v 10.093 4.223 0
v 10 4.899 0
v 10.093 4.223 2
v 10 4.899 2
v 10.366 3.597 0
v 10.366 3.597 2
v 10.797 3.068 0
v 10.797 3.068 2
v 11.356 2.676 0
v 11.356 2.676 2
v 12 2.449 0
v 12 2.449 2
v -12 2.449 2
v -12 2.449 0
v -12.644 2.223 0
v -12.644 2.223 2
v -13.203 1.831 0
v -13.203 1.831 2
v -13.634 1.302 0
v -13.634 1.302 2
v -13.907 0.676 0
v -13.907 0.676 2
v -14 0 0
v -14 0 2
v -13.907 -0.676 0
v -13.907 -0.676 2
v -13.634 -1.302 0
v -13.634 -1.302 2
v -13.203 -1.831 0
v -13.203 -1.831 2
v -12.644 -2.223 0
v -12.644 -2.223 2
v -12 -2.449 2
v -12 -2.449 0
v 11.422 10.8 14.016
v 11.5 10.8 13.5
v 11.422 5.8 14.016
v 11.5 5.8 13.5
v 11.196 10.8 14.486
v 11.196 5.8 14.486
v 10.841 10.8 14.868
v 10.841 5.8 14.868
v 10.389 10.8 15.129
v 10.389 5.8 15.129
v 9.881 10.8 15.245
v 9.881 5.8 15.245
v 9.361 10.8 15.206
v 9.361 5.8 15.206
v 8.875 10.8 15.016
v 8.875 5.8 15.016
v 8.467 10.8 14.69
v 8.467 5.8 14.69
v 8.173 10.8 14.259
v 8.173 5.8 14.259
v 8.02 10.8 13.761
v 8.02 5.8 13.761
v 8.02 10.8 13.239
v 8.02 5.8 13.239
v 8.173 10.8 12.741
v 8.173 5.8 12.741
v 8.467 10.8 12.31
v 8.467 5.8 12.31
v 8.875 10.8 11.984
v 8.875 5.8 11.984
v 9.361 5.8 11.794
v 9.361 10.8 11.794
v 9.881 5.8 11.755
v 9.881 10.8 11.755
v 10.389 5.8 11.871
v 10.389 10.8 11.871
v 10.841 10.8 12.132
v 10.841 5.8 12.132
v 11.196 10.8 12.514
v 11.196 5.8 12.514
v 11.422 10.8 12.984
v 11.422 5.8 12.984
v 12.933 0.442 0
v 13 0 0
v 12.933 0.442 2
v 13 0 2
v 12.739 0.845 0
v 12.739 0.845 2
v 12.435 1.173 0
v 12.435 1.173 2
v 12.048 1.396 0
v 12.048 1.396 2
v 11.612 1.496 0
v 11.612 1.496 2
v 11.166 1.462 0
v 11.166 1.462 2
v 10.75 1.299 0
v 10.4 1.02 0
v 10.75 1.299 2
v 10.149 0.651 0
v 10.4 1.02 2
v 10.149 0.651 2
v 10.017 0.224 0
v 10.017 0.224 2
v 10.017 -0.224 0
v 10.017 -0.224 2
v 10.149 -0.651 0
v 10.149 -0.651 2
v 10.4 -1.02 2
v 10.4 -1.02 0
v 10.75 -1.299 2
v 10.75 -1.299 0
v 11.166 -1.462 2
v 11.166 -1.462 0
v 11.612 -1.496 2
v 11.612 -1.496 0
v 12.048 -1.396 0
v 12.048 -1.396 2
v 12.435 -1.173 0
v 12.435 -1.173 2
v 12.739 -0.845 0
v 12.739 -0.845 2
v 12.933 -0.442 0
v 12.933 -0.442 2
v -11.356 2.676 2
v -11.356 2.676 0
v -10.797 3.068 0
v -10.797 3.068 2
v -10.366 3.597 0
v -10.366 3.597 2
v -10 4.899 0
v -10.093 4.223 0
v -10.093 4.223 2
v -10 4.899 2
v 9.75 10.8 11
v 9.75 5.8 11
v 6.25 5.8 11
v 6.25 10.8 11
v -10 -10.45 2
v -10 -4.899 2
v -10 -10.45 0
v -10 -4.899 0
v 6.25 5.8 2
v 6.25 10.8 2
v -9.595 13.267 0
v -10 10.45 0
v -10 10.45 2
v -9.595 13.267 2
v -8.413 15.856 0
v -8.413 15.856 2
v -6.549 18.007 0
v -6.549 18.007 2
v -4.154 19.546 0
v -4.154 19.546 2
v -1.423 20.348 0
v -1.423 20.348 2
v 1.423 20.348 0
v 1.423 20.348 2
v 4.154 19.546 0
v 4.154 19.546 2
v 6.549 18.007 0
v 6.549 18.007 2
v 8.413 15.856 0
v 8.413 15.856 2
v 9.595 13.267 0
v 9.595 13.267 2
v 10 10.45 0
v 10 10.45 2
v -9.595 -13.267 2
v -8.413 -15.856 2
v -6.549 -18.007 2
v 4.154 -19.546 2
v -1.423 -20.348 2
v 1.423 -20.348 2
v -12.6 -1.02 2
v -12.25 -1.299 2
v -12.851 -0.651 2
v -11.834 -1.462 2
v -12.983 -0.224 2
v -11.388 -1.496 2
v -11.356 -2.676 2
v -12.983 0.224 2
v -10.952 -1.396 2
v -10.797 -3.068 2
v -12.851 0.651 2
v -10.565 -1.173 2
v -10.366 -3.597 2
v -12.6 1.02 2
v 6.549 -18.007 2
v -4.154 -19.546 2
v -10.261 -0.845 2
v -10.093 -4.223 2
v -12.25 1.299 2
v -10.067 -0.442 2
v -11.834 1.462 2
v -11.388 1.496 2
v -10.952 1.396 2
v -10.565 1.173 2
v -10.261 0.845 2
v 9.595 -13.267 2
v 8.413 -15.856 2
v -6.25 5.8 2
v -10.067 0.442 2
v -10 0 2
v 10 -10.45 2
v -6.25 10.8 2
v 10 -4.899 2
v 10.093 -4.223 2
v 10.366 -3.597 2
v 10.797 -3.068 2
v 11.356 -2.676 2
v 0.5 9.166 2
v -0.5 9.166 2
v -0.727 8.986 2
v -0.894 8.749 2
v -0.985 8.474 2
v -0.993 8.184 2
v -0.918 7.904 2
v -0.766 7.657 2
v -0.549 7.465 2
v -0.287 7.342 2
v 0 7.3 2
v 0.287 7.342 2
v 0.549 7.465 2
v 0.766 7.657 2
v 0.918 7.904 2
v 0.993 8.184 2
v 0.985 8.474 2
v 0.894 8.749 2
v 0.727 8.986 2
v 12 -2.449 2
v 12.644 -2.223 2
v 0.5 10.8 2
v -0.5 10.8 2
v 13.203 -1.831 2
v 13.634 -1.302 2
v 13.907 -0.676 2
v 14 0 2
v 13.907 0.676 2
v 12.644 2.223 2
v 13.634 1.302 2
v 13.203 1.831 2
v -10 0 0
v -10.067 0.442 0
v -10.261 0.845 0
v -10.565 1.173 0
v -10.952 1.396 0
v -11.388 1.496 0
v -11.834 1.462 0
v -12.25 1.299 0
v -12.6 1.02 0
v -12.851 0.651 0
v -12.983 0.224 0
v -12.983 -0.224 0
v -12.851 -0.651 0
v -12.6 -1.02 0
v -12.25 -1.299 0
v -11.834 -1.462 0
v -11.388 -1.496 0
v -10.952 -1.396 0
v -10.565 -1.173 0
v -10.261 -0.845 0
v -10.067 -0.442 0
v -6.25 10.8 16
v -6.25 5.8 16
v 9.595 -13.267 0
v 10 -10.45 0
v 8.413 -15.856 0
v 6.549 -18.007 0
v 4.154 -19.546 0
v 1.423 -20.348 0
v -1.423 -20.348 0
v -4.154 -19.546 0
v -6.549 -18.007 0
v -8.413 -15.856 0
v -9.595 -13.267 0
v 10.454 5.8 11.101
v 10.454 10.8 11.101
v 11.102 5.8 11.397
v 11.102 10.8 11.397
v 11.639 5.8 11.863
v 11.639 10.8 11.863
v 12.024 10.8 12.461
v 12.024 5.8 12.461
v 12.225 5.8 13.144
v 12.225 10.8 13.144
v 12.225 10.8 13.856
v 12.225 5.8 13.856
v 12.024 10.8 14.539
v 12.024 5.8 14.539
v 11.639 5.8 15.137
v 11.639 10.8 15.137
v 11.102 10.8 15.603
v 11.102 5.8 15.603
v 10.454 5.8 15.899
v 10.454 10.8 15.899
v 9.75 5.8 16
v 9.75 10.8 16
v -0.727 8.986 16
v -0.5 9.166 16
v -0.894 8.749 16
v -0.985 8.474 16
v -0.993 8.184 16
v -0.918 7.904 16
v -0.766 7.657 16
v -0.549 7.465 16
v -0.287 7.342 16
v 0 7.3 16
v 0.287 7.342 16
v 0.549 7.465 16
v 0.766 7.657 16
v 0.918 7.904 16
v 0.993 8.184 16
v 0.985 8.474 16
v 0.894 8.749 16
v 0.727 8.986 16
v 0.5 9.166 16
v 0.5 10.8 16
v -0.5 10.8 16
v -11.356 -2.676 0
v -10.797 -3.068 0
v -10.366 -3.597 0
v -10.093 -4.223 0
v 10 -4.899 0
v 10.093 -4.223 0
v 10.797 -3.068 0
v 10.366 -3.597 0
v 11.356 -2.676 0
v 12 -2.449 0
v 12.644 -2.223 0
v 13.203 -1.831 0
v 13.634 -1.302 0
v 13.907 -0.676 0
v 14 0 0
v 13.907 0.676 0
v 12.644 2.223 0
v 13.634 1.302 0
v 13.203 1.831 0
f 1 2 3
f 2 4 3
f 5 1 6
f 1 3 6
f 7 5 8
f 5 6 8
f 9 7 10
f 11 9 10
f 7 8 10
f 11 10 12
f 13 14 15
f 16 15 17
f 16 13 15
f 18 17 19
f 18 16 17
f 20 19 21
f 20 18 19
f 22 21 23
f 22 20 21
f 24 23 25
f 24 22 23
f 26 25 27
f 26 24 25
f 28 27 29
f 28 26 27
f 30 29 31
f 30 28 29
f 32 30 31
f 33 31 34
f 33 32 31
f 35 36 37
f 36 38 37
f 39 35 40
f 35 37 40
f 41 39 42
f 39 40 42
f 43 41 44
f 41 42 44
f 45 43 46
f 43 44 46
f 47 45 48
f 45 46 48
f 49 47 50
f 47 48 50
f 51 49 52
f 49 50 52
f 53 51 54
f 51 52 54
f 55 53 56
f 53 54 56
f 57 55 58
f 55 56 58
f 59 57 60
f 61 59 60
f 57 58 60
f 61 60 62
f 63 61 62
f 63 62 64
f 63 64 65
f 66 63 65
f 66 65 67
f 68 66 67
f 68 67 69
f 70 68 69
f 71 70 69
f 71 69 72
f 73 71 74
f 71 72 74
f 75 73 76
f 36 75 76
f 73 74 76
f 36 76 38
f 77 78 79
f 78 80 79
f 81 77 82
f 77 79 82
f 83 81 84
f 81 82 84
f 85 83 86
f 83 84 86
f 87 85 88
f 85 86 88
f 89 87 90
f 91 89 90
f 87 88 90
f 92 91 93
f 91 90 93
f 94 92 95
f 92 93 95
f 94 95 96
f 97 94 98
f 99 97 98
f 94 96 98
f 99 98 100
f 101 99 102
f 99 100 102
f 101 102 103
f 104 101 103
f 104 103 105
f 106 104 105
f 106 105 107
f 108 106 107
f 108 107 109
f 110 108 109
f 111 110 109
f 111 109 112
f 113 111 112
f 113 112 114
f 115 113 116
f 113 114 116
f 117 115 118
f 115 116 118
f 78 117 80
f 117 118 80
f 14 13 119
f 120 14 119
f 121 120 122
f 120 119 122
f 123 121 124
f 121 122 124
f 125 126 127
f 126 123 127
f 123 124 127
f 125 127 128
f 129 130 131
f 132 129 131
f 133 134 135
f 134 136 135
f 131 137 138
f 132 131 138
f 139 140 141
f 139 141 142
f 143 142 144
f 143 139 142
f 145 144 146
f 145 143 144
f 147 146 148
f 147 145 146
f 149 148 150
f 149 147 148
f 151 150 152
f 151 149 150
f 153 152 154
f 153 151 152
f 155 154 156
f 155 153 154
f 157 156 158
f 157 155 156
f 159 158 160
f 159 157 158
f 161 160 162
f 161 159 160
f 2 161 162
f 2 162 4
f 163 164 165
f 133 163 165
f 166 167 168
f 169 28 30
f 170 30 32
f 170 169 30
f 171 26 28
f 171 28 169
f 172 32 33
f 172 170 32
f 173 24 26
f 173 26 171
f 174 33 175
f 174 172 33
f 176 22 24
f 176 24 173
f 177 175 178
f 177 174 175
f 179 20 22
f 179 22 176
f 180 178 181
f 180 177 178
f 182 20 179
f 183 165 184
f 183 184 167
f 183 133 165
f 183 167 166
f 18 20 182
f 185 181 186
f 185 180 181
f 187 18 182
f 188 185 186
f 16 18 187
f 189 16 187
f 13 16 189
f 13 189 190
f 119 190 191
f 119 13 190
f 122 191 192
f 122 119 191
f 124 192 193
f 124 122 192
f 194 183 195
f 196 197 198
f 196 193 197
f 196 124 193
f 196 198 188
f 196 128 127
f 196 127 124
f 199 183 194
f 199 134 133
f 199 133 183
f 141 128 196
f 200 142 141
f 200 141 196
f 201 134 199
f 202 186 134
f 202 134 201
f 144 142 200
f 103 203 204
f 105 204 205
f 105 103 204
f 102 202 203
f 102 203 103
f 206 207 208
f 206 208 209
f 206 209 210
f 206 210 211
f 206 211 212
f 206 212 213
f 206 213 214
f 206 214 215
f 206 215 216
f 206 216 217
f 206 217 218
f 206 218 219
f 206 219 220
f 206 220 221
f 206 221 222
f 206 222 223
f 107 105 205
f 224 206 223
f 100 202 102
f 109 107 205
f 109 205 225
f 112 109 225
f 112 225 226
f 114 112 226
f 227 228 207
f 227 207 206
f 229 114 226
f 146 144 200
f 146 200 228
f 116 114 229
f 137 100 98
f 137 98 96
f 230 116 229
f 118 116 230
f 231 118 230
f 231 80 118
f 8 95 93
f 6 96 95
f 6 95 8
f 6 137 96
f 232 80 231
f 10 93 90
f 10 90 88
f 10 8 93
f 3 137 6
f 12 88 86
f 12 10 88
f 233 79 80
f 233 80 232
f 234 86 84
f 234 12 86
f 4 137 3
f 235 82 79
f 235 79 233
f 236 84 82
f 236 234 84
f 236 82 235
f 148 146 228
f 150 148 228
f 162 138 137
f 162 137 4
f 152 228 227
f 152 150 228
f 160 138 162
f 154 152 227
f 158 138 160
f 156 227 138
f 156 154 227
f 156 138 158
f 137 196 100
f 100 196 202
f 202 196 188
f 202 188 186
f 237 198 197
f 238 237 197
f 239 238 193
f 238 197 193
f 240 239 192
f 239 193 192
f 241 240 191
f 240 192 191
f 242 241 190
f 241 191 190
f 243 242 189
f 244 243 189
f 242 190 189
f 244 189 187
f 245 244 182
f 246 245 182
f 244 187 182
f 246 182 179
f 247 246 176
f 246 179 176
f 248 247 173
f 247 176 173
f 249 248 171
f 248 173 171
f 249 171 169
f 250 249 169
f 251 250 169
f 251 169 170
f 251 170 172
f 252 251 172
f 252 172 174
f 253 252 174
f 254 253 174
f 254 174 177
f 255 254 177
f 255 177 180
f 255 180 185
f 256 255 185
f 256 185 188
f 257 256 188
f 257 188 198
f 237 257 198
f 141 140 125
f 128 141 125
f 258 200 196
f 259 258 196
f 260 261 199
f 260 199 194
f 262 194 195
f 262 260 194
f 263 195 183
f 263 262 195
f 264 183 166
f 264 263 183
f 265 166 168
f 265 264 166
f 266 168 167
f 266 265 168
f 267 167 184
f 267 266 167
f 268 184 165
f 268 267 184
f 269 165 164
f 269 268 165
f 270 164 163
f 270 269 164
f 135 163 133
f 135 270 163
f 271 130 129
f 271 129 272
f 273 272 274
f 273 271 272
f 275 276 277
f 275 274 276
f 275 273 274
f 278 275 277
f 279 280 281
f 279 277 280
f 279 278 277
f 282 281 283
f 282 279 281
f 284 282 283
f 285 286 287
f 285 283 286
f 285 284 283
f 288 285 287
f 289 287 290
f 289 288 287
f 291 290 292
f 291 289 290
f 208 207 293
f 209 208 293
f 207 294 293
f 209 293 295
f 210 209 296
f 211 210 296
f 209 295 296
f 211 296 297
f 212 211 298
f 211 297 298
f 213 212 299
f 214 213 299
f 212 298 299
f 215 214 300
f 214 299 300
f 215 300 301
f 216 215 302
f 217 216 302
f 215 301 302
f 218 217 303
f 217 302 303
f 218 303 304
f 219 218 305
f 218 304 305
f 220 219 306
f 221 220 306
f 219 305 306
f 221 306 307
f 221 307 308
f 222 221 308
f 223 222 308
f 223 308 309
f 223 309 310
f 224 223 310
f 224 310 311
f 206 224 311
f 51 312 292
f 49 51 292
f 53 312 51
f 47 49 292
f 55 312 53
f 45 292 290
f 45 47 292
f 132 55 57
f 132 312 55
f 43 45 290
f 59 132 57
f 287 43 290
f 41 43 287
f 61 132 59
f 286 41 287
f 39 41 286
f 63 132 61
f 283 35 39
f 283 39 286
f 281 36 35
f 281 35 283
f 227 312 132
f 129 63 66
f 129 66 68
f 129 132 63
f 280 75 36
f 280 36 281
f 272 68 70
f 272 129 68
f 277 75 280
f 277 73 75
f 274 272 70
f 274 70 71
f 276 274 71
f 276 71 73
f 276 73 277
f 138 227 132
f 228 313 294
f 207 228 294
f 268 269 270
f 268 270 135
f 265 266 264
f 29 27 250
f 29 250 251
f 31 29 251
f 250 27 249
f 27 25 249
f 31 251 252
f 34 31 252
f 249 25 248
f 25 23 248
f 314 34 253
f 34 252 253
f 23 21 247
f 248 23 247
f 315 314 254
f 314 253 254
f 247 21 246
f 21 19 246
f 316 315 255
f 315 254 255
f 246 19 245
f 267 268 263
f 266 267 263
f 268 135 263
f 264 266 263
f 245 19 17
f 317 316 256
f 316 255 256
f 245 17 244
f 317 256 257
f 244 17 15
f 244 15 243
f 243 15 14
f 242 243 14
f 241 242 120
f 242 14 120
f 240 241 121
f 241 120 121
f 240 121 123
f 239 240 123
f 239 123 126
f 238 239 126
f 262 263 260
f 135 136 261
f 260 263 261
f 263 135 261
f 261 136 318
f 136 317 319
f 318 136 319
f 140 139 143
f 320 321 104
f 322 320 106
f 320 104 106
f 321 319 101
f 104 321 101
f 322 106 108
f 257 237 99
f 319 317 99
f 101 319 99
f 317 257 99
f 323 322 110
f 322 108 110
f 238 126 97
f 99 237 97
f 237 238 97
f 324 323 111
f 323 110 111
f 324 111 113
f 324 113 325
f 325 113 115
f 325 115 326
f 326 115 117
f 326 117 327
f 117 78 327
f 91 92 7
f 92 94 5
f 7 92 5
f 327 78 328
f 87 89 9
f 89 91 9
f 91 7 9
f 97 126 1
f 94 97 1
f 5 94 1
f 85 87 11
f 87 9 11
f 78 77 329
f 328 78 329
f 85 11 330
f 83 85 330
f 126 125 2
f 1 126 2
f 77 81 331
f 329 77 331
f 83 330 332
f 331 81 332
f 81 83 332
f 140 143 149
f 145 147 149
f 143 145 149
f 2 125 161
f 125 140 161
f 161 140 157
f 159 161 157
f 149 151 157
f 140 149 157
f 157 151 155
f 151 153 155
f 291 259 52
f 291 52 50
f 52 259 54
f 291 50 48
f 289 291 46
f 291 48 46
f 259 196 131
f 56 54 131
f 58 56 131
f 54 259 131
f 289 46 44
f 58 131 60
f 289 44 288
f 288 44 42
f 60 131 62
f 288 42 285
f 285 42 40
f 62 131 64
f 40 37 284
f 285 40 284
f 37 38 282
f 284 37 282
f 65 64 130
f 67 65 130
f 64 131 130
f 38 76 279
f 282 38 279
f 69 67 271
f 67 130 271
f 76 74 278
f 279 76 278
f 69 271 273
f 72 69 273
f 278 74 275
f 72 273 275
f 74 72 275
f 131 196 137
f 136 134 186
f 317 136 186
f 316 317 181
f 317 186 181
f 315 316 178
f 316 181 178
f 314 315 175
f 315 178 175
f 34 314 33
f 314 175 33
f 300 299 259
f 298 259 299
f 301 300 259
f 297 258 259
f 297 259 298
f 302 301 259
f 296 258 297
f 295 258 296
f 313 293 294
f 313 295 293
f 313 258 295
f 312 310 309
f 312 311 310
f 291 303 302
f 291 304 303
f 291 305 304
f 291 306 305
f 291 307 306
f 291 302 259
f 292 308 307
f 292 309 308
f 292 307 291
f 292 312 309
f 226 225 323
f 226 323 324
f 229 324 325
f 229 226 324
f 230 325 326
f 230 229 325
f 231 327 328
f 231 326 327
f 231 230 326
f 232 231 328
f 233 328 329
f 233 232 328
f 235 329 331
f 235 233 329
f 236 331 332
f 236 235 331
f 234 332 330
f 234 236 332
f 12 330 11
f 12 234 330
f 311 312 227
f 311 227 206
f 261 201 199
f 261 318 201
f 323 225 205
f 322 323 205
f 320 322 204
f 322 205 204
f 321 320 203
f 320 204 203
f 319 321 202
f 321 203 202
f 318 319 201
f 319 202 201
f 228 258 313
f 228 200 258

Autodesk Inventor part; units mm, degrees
ref_plane "YZ Plane" through (0, 0, 0) normal (1, 0, 0) x (0, 1, 0)
ref_plane "XZ Plane" through (0, 0, 0) normal (0, 1, 0) x (-1, 0, 0)
ref_plane "XY Plane" through (0, 0, 0) normal (0, 0, 1) x (1, 0, 0)
sketch "Sketch1" plane through (0, 0, 0) normal (0, 0, 1) x (1, 0, 0)
  line L0 (0, 10.45) -> (0, -10.45)
  arc A0 (10, 10.45) -> (-10, 10.45) centre (0, 10.45) ccw
  arc A1 (-10, -10.45) -> (10, -10.45) centre (0, -10.45) ccw
  line L1 (-10, 10.45) -> (-10, -10.45)
  line L2 (10, 10.45) -> (10, -10.45)
  point P0 (0, 0)
  point P1 (0, 0)
  dimension "d0" = 20.9
  dimension "d3" = 10
  dimension "d4" = 10
extrude "Extrusion1" add sketch "Sketch1" along normal blind 2
sketch "Sketch2" plane through (0, 0, 2) normal (0, 0, 1) x (1, 0, 0)
  line L0 (-10, 10.45) -> (-10, -10.45) projected
  arc A0 (-10, -10.45) -> (10, -10.45) centre (0, -10.45) ccw projected
  line L1 (10, -10.45) -> (10, 10.45) projected
  arc A1 (10, 10.45) -> (-10, 10.45) centre (0, 10.45) ccw projected
  line L2 (-11.5, 0) -> (11.5, 0)
  circle A2 centre (-11.5, 0) radius 1.5
  circle A3 centre (11.5, 0) radius 1.5
  circle A4 centre (-11.5, 0) radius 2.5
  circle A5 centre (11.5, 0) radius 2.5
  point P0 (0, 0)
  point P1 (0, 0)
  dimension "d7" = 23
  dimension "d8" = 3
  dimension "d9" = 3
  dimension "d10" = 5
  dimension "d11" = 5
extrude "Extrusion2" add sketch "Sketch2" against normal blind 2 contours A4 L2 L0 | L0 A4 | L2 A4 L0 | A5 L1 | L1 L2 A5 | L2 L1 A5
fillet "Fillet1" radius 2.5 4 edges at (10, 2, 1) (10, -2, 1) (-10, 2, 1) (-10, -2, 1)
sketch "Sketch3" plane through (0, 0, 2) normal (0, 0, 1) x (1, 0, 0)
  circle A0 centre (11.5, 0) radius 1.5 projected
  arc A1 (12, -2.4495) -> (12, 2.4495) centre (11.5, 0) ccw projected
  arc A2 (10, 4.899) -> (12, 2.4495) centre (12.5, 4.899) ccw projected
  line L0 (10, 4.899) -> (10, 10.45) projected
  arc A3 (10, 10.45) -> (-10, 10.45) centre (0, 10.45) ccw
  line L1 (-10, 10.45) -> (-10, 4.899) projected
  arc A4 (-12, 2.4495) -> (-10, 4.899) centre (-12.5, 4.899) ccw projected
  arc A5 (-12, 2.4495) -> (-12, -2.4495) centre (-11.5, 0) ccw projected
  arc A6 (-10, -4.899) -> (-12, -2.4495) centre (-12.5, -4.899) ccw projected
  line L2 (-10, -4.899) -> (-10, -10.45) projected
  arc A7 (-10, -10.45) -> (10, -10.45) centre (0, -10.45) ccw projected
  line L3 (10, -10.45) -> (10, -4.899) projected
  arc A8 (12, -2.4495) -> (10, -4.899) centre (12.5, -4.899) ccw projected
  circle A9 centre (-11.5, 0) radius 1.5 projected
  line L4 (-6.25, 10.8) -> (-6.25, 5.8)
  line L5 (-6.25, 5.8) -> (6.25, 5.8)
  line L6 (6.25, 5.8) -> (6.25, 10.8)
  line L7 (11.5, 0) -> (0, 0)
  line L8 (0, 0) -> (5.75, 0)
  line L9 (-6.25, 10.8) -> (6.25, 10.8)
  point P0 (0, 0)
  point P1 (0, 10.45)
  dimension "d20" = 5.8
  dimension "d21" = 5
  dimension "d22" = 5
extrude "Extrusion3" add sketch "Sketch3" along normal blind 14 contours L9 L6 L5 L4
sketch "Sketch4" plane through (0, 0, 16) normal (0, 0, 1) x (1, 0, 0)
  line L0 (-6.25, 5.8) -> (6.25, 5.8) projected
  line L1 (6.25, 5.8) -> (6.25, 10.8) projected
  line L2 (6.25, 10.8) -> (-6.25, 10.8) projected
  line L3 (-6.25, 10.8) -> (-6.25, 5.8) projected
  line L4 (-0.5, 10.8) -> (0.5, 10.8)
  line L5 (6.25, 10.8) -> (-6.25, 10.8) projected
  arc A0 (-0.5, 9.166) -> (0.5, 9.166) centre (0, 8.3) ccw
  line L6 (-0.5, 10.8) -> (-0.5, 9.166)
  line L7 (0.5, 10.8) -> (0.5, 9.166)
  point P0 (0, 0)
  point P1 (0, 10.8)
  point P2 (0, 10.8)
  dimension "d25" = 1
  dimension "d27" = 2
extrude "Extrusion4" cut sketch "Sketch4" against normal blind 14 contours L2 L7 A0 L6
sketch "Sketch5" plane through (-6.25, 5.8, 2) normal (0, -1, 0) x (1, 0, 0)
  line L0 (12.5, 0) -> (0, 0) projected
  line L1 (12.5, 0) -> (12.5, 14) projected
  line L2 (0, 14) -> (12.5, 14) projected
  line L3 (0, 0) -> (0, 14) projected
  line L4 (12.5, 0) -> (12.5, 14) projected
  line L5 (12.5, 14) -> (16, 14)
  circle A0 centre (16, 11.5) radius 2.5
  circle A1 centre (16, 11.5) radius 1.75
  line L6 (16, 9) -> (12.5, 9)
  point P0 (6.25, -2)
  dimension "d30" = 3.5
  dimension "d33" = 3.5
extrude "Extrusion5" add sketch "Sketch5" against normal blind 5 contours L1 L5 A0 L6 | A0
properties part number "Base de la pinza 2"
